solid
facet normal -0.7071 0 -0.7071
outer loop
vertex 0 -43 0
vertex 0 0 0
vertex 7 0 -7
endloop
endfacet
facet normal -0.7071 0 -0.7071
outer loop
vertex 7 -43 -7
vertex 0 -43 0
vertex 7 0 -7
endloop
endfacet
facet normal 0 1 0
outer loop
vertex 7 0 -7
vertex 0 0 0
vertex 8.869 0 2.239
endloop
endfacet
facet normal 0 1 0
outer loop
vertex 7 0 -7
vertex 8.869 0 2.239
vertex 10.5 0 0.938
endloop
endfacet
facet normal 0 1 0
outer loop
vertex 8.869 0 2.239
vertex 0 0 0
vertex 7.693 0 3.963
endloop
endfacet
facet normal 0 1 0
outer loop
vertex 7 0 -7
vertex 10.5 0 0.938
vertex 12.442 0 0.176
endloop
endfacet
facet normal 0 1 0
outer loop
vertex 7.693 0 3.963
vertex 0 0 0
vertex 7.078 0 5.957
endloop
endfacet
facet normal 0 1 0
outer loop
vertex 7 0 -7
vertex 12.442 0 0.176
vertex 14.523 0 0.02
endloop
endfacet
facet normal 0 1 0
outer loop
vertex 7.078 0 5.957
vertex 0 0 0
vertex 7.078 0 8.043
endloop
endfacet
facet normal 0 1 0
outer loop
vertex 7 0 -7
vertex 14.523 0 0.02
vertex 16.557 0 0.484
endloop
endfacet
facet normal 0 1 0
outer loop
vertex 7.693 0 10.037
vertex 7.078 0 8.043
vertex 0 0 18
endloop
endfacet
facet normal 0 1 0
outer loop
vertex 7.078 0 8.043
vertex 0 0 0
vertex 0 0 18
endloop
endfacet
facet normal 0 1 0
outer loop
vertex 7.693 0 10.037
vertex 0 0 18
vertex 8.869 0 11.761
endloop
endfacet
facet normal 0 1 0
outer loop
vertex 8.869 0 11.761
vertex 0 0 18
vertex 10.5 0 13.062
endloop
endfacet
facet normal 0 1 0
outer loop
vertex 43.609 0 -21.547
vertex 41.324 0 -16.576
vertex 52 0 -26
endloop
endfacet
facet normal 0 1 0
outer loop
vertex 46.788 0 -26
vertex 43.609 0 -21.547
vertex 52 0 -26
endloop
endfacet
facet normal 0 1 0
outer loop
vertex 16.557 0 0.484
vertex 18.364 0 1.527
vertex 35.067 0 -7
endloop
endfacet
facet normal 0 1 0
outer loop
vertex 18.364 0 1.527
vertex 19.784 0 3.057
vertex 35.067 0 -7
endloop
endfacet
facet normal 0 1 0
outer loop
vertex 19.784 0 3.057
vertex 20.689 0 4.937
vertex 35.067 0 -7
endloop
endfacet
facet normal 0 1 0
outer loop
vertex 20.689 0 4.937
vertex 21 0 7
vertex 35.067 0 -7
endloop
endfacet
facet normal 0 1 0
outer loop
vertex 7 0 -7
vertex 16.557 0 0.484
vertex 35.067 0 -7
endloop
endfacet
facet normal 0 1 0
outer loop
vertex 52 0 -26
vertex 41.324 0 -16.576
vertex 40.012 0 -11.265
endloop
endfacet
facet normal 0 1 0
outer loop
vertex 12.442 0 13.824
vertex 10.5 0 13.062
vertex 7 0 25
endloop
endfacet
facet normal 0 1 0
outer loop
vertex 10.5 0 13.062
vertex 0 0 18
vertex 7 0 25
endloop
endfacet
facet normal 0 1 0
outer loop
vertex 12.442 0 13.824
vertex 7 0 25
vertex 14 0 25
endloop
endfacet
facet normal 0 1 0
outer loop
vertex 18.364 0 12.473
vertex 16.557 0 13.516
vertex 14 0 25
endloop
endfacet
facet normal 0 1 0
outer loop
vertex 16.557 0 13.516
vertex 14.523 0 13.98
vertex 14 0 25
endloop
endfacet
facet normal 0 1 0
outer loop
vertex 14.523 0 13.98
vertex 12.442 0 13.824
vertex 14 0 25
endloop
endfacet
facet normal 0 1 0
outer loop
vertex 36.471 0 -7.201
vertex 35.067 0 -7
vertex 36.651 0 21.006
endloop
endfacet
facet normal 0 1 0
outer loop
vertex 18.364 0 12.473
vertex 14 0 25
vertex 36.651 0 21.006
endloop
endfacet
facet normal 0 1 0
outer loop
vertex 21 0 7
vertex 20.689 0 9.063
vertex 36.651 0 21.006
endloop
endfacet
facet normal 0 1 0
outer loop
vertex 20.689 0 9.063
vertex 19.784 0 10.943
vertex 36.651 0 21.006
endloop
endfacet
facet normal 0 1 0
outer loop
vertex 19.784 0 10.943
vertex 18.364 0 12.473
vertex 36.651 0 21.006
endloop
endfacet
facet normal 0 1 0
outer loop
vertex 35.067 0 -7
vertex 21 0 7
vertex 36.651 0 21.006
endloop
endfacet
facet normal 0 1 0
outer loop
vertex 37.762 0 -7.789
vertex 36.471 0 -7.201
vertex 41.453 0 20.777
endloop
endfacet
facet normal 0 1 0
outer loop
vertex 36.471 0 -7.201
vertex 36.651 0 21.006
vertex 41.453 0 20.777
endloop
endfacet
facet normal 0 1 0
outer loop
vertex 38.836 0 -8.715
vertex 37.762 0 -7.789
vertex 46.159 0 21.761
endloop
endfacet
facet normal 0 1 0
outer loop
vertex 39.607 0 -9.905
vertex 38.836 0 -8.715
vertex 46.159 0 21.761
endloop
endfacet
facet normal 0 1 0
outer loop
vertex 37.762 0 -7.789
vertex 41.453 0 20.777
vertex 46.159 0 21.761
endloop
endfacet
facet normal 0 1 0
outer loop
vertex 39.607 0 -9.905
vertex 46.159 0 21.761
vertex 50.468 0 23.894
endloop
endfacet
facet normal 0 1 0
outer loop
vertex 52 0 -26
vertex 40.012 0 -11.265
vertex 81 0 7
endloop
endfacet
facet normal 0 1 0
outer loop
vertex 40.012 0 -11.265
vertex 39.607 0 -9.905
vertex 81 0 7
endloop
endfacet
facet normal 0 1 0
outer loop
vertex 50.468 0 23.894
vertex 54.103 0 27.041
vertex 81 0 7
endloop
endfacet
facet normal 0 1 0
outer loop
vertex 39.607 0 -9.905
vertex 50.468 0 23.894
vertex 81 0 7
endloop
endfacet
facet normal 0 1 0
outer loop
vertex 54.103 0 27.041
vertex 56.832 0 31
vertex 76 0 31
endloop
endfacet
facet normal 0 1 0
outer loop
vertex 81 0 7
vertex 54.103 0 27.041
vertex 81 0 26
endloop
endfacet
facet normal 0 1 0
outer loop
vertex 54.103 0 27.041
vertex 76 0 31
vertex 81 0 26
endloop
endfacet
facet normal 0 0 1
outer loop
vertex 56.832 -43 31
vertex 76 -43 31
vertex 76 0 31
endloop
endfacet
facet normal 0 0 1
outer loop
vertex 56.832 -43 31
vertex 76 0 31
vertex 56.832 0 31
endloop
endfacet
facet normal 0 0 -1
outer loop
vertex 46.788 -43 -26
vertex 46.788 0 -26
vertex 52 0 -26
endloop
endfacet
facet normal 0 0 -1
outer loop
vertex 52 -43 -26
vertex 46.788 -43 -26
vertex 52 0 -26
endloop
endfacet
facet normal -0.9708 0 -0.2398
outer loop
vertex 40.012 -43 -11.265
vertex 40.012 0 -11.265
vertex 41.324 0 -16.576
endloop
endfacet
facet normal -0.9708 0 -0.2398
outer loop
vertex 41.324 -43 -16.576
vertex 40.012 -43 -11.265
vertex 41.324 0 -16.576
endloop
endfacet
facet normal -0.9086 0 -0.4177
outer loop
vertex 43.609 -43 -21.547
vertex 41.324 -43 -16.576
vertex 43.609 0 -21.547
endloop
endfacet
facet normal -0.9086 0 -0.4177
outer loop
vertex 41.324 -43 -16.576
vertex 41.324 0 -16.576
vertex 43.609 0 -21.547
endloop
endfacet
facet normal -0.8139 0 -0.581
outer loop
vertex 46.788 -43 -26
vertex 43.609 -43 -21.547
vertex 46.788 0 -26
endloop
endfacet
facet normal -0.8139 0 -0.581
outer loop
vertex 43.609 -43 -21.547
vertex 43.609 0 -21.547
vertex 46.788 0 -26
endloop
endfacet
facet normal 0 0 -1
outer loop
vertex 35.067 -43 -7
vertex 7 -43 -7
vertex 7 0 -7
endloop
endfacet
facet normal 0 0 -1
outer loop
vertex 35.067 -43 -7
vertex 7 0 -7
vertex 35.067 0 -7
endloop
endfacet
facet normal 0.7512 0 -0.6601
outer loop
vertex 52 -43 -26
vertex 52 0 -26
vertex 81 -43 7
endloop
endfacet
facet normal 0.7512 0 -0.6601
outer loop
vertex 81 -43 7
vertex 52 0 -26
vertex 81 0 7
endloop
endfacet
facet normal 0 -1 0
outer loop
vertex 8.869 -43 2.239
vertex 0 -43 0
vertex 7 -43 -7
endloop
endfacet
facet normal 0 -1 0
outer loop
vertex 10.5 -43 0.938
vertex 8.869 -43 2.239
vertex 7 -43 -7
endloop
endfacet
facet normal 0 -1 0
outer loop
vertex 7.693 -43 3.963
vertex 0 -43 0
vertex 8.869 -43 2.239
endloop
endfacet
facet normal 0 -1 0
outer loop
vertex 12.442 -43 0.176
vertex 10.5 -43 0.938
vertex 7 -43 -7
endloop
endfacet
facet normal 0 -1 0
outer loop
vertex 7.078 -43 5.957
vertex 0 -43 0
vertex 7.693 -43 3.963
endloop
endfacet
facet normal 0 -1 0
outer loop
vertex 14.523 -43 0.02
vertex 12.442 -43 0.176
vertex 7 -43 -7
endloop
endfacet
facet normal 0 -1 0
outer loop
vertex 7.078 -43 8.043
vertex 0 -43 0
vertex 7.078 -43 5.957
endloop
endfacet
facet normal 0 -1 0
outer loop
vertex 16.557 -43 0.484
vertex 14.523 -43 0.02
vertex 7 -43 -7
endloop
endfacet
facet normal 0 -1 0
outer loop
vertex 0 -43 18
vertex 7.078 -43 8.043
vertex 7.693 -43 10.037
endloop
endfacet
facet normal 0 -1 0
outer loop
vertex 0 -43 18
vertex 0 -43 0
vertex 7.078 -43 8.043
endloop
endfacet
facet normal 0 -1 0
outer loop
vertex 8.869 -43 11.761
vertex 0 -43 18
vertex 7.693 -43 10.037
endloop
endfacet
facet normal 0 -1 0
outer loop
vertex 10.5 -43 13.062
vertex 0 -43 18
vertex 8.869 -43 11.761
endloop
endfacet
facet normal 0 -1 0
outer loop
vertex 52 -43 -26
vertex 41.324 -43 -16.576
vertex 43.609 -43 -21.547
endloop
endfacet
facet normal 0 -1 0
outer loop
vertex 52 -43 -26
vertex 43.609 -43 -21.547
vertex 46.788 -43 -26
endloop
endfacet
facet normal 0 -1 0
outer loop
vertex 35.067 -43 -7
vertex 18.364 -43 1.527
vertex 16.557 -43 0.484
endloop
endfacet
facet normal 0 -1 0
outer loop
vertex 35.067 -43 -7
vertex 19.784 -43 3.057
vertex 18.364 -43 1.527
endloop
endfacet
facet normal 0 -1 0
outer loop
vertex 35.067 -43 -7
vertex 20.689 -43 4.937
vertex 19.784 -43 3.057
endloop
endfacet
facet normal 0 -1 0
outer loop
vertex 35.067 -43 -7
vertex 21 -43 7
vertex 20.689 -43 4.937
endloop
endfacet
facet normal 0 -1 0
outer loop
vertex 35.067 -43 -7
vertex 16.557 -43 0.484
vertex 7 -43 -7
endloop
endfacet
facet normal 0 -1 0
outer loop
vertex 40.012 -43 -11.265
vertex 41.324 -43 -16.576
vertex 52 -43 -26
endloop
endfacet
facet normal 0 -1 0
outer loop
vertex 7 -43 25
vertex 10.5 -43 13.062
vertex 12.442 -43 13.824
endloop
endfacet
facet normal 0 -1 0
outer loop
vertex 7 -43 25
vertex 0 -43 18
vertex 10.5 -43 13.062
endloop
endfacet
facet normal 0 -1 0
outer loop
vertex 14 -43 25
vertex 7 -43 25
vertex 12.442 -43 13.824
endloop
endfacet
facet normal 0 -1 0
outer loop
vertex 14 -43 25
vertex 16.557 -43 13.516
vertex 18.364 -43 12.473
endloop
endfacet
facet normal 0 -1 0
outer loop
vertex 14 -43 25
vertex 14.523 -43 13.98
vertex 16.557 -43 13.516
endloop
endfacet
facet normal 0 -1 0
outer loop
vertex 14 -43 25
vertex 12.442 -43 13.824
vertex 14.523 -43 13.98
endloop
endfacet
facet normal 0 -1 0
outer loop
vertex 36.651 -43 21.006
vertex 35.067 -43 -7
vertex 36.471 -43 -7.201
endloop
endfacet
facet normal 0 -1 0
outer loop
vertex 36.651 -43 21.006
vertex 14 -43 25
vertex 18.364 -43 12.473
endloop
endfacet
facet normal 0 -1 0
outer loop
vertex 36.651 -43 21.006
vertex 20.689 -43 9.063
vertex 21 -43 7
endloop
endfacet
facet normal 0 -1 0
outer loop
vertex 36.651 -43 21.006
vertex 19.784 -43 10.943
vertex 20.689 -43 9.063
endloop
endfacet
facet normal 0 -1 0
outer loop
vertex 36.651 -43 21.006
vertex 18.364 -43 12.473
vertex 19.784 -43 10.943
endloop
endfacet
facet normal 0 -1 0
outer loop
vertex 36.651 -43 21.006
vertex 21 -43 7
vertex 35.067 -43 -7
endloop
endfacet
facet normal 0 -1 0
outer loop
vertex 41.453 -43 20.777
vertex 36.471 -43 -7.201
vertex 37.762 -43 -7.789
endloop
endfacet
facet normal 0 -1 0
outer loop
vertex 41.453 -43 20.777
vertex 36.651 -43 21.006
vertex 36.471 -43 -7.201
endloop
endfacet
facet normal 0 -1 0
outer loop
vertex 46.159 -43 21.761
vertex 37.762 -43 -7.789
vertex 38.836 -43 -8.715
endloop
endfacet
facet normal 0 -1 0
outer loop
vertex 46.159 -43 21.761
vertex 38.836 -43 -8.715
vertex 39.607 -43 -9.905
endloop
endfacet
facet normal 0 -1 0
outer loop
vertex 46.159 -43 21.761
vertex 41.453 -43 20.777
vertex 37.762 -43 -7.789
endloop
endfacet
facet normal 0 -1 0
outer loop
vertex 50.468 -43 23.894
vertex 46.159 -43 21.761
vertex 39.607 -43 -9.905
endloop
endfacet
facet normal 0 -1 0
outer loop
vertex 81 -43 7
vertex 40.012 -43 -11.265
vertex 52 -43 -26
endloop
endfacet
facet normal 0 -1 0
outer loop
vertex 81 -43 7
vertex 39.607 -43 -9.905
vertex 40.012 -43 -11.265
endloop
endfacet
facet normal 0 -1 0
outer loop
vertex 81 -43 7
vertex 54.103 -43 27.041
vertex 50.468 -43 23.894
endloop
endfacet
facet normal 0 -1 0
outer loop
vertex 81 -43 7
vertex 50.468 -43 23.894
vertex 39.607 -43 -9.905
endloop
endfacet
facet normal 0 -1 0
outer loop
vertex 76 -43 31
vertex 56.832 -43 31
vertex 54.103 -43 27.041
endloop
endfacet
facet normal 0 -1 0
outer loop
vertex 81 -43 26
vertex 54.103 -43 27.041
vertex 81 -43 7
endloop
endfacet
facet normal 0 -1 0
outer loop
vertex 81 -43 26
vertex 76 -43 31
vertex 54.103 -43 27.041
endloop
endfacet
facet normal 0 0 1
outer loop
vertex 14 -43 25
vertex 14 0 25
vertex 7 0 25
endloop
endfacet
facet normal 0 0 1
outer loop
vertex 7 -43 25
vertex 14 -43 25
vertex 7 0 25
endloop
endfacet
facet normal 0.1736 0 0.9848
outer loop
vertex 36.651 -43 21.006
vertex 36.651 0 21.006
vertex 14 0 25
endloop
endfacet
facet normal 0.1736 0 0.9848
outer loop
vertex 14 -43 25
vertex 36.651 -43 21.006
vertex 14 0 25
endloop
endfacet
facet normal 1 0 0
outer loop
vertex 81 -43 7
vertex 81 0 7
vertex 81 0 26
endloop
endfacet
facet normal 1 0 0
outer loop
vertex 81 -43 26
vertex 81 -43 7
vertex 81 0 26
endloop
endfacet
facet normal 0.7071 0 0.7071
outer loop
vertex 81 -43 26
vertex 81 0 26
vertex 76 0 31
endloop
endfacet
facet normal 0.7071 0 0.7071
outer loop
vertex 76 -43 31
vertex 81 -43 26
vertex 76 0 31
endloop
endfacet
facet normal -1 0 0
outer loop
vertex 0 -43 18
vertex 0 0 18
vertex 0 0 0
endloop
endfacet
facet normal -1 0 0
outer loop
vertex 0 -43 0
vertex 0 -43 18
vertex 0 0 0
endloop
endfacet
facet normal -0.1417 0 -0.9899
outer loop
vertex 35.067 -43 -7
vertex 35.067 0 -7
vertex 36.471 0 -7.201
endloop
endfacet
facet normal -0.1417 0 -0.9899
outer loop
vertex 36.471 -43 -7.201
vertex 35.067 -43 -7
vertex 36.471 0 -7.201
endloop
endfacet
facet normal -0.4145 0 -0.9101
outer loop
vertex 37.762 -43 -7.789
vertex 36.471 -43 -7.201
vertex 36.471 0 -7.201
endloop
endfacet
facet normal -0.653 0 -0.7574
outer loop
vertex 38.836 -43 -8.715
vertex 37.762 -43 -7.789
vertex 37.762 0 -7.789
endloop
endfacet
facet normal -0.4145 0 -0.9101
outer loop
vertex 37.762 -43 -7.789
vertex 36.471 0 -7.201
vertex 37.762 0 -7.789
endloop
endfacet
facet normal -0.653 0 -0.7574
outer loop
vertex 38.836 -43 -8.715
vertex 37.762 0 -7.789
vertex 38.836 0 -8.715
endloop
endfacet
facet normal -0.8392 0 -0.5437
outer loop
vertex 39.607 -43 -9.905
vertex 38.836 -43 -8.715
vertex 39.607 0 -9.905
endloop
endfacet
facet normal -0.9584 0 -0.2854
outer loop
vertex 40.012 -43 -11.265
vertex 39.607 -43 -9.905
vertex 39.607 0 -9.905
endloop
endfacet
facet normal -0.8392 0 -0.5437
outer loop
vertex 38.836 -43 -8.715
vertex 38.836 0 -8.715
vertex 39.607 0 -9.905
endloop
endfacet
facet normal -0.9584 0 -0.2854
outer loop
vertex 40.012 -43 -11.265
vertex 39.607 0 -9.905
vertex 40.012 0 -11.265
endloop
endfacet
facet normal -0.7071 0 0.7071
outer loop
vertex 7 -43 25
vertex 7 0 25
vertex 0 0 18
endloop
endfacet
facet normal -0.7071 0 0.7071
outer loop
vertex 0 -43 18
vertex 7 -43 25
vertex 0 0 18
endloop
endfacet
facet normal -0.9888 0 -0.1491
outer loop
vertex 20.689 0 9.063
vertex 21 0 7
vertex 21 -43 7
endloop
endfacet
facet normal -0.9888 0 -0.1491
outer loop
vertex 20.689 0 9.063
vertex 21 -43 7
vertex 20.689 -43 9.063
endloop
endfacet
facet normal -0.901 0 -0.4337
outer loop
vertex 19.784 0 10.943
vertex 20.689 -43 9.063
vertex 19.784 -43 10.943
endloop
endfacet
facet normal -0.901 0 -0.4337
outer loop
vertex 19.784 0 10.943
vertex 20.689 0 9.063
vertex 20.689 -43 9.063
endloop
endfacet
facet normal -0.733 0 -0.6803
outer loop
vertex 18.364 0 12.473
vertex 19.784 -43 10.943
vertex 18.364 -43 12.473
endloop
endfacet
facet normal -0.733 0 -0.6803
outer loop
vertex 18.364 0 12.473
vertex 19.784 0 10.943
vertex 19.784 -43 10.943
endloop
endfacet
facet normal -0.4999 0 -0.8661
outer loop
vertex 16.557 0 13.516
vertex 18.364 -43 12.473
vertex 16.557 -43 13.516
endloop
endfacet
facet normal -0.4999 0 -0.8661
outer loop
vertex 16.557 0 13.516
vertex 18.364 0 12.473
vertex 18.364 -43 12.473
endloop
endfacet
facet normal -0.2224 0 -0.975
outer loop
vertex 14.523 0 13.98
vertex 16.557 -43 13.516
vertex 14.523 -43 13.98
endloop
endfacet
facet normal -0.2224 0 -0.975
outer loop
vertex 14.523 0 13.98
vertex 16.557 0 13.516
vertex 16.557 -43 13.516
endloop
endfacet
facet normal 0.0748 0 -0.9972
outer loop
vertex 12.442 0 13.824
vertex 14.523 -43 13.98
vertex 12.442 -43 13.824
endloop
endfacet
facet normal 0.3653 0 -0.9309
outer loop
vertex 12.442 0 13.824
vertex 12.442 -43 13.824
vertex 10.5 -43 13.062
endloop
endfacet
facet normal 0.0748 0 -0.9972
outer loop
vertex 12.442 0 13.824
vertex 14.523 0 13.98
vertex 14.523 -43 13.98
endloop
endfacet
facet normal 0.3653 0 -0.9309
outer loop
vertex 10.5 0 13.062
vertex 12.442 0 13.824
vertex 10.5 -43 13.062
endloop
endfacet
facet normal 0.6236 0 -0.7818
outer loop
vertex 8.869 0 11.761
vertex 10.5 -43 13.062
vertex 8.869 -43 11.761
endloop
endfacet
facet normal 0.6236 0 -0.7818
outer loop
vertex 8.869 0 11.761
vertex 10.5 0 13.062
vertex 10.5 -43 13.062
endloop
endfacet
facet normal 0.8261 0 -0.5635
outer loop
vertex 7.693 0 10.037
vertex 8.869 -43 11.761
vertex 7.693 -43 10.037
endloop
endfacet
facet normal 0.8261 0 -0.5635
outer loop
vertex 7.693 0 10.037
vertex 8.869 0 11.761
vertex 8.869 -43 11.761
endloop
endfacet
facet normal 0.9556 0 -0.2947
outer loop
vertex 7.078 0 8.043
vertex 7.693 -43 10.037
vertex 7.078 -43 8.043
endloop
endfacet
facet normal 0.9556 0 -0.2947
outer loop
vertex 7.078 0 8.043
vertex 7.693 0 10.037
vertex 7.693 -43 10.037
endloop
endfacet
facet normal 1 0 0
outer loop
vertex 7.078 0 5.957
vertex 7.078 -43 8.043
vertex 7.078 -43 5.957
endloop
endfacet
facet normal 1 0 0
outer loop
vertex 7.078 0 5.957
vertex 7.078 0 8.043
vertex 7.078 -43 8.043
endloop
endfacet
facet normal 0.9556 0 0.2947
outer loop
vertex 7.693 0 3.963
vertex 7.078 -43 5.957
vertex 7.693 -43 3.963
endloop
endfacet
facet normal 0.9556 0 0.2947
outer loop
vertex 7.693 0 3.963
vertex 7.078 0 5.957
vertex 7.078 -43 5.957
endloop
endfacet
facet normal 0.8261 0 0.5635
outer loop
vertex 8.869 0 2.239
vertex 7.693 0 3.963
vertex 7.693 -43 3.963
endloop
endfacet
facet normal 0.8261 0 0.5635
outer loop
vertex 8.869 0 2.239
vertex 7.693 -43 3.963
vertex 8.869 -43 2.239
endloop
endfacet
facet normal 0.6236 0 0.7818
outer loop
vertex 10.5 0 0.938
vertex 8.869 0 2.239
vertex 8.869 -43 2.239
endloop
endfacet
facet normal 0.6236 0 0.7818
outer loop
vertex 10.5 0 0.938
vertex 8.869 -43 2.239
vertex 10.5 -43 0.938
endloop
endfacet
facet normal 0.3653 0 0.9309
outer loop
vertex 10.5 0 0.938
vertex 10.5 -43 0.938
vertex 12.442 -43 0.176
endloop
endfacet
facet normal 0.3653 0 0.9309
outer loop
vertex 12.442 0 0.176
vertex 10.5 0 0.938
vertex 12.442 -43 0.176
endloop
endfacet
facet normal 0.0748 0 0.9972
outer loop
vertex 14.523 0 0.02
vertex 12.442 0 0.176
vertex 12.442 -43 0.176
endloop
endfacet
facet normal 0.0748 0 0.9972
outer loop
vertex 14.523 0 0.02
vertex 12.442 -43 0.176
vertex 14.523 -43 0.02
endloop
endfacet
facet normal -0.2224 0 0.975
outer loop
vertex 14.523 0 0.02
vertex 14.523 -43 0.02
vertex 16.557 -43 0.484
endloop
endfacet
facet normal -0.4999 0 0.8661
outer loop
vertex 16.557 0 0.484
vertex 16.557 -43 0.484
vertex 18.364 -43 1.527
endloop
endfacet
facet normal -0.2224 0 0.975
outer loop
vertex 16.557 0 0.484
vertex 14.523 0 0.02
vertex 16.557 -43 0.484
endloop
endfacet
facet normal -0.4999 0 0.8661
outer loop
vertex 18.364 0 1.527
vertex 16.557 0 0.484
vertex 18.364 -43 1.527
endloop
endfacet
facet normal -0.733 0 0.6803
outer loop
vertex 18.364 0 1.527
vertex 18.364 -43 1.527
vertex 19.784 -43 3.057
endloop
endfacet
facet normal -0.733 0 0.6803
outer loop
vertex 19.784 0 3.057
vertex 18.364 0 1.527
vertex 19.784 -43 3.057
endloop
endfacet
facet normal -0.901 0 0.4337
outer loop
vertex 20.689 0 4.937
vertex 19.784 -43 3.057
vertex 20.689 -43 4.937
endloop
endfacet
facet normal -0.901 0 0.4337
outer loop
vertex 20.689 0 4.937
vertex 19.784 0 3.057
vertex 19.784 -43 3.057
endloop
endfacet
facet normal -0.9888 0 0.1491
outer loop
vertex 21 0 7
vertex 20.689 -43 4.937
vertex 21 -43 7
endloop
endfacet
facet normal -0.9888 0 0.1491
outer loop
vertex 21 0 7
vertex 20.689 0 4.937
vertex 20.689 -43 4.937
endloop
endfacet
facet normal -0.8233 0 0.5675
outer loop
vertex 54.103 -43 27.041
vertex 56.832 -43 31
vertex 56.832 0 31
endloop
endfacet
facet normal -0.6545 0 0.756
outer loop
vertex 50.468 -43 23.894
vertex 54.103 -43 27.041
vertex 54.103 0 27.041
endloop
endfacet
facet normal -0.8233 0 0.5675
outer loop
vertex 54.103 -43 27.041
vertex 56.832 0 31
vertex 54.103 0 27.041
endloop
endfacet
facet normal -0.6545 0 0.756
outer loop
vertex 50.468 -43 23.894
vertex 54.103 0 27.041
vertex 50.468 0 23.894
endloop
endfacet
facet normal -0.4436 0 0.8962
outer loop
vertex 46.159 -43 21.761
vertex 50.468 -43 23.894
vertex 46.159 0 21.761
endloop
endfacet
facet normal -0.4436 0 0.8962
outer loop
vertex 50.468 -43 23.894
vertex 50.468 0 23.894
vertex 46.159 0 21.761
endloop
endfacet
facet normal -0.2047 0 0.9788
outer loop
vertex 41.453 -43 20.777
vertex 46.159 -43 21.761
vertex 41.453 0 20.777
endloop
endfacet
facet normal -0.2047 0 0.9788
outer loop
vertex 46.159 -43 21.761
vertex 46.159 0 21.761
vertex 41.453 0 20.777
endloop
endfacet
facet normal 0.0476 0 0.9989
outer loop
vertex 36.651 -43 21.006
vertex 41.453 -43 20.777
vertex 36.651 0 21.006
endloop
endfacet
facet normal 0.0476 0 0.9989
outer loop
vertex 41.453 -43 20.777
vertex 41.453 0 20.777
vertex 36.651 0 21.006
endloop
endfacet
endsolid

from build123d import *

# Parameters (mm, degrees)
F0_R     = 7
F1_DEPTH = 43


with BuildPart() as f1:
    # F0 (on Front) → F1 (new body)
    with BuildSketch(Plane.XZ):
        with BuildLine():
            Line((0, 18), (0, 0))
            Line((0, 0), (7, -7))
            Line((7, -7), (14, -7))
            Line((14, -7), (35.066626, -7))
            ThreePointArc((35.066626, -7), (38.331862, -8.213414), (40.012265, -11.264706))
            ThreePointArc((40.012265, -11.264706), (42.349095, -19.115672), (46.788067, -26))
            Line((46.788067, -26), (52, -26))
            Line((52, -26), (81, 7))
            Line((81, 7), (81, 26))
            Line((81, 26), (76, 31))
            Line((76, 31), (56.832022, 31))
            ThreePointArc((56.832022, 31), (48.381545, 22.690776), (36.650578, 21.006092))
            Line((36.650578, 21.006092), (14, 25))
            Line((14, 25), (7, 25))
            Line((7, 25), (0, 18))
        make_face()
        with Locations((14, 7)):
            Circle(F0_R, mode=Mode.SUBTRACT)
    extrude(amount=F1_DEPTH)


solid = f1.part
